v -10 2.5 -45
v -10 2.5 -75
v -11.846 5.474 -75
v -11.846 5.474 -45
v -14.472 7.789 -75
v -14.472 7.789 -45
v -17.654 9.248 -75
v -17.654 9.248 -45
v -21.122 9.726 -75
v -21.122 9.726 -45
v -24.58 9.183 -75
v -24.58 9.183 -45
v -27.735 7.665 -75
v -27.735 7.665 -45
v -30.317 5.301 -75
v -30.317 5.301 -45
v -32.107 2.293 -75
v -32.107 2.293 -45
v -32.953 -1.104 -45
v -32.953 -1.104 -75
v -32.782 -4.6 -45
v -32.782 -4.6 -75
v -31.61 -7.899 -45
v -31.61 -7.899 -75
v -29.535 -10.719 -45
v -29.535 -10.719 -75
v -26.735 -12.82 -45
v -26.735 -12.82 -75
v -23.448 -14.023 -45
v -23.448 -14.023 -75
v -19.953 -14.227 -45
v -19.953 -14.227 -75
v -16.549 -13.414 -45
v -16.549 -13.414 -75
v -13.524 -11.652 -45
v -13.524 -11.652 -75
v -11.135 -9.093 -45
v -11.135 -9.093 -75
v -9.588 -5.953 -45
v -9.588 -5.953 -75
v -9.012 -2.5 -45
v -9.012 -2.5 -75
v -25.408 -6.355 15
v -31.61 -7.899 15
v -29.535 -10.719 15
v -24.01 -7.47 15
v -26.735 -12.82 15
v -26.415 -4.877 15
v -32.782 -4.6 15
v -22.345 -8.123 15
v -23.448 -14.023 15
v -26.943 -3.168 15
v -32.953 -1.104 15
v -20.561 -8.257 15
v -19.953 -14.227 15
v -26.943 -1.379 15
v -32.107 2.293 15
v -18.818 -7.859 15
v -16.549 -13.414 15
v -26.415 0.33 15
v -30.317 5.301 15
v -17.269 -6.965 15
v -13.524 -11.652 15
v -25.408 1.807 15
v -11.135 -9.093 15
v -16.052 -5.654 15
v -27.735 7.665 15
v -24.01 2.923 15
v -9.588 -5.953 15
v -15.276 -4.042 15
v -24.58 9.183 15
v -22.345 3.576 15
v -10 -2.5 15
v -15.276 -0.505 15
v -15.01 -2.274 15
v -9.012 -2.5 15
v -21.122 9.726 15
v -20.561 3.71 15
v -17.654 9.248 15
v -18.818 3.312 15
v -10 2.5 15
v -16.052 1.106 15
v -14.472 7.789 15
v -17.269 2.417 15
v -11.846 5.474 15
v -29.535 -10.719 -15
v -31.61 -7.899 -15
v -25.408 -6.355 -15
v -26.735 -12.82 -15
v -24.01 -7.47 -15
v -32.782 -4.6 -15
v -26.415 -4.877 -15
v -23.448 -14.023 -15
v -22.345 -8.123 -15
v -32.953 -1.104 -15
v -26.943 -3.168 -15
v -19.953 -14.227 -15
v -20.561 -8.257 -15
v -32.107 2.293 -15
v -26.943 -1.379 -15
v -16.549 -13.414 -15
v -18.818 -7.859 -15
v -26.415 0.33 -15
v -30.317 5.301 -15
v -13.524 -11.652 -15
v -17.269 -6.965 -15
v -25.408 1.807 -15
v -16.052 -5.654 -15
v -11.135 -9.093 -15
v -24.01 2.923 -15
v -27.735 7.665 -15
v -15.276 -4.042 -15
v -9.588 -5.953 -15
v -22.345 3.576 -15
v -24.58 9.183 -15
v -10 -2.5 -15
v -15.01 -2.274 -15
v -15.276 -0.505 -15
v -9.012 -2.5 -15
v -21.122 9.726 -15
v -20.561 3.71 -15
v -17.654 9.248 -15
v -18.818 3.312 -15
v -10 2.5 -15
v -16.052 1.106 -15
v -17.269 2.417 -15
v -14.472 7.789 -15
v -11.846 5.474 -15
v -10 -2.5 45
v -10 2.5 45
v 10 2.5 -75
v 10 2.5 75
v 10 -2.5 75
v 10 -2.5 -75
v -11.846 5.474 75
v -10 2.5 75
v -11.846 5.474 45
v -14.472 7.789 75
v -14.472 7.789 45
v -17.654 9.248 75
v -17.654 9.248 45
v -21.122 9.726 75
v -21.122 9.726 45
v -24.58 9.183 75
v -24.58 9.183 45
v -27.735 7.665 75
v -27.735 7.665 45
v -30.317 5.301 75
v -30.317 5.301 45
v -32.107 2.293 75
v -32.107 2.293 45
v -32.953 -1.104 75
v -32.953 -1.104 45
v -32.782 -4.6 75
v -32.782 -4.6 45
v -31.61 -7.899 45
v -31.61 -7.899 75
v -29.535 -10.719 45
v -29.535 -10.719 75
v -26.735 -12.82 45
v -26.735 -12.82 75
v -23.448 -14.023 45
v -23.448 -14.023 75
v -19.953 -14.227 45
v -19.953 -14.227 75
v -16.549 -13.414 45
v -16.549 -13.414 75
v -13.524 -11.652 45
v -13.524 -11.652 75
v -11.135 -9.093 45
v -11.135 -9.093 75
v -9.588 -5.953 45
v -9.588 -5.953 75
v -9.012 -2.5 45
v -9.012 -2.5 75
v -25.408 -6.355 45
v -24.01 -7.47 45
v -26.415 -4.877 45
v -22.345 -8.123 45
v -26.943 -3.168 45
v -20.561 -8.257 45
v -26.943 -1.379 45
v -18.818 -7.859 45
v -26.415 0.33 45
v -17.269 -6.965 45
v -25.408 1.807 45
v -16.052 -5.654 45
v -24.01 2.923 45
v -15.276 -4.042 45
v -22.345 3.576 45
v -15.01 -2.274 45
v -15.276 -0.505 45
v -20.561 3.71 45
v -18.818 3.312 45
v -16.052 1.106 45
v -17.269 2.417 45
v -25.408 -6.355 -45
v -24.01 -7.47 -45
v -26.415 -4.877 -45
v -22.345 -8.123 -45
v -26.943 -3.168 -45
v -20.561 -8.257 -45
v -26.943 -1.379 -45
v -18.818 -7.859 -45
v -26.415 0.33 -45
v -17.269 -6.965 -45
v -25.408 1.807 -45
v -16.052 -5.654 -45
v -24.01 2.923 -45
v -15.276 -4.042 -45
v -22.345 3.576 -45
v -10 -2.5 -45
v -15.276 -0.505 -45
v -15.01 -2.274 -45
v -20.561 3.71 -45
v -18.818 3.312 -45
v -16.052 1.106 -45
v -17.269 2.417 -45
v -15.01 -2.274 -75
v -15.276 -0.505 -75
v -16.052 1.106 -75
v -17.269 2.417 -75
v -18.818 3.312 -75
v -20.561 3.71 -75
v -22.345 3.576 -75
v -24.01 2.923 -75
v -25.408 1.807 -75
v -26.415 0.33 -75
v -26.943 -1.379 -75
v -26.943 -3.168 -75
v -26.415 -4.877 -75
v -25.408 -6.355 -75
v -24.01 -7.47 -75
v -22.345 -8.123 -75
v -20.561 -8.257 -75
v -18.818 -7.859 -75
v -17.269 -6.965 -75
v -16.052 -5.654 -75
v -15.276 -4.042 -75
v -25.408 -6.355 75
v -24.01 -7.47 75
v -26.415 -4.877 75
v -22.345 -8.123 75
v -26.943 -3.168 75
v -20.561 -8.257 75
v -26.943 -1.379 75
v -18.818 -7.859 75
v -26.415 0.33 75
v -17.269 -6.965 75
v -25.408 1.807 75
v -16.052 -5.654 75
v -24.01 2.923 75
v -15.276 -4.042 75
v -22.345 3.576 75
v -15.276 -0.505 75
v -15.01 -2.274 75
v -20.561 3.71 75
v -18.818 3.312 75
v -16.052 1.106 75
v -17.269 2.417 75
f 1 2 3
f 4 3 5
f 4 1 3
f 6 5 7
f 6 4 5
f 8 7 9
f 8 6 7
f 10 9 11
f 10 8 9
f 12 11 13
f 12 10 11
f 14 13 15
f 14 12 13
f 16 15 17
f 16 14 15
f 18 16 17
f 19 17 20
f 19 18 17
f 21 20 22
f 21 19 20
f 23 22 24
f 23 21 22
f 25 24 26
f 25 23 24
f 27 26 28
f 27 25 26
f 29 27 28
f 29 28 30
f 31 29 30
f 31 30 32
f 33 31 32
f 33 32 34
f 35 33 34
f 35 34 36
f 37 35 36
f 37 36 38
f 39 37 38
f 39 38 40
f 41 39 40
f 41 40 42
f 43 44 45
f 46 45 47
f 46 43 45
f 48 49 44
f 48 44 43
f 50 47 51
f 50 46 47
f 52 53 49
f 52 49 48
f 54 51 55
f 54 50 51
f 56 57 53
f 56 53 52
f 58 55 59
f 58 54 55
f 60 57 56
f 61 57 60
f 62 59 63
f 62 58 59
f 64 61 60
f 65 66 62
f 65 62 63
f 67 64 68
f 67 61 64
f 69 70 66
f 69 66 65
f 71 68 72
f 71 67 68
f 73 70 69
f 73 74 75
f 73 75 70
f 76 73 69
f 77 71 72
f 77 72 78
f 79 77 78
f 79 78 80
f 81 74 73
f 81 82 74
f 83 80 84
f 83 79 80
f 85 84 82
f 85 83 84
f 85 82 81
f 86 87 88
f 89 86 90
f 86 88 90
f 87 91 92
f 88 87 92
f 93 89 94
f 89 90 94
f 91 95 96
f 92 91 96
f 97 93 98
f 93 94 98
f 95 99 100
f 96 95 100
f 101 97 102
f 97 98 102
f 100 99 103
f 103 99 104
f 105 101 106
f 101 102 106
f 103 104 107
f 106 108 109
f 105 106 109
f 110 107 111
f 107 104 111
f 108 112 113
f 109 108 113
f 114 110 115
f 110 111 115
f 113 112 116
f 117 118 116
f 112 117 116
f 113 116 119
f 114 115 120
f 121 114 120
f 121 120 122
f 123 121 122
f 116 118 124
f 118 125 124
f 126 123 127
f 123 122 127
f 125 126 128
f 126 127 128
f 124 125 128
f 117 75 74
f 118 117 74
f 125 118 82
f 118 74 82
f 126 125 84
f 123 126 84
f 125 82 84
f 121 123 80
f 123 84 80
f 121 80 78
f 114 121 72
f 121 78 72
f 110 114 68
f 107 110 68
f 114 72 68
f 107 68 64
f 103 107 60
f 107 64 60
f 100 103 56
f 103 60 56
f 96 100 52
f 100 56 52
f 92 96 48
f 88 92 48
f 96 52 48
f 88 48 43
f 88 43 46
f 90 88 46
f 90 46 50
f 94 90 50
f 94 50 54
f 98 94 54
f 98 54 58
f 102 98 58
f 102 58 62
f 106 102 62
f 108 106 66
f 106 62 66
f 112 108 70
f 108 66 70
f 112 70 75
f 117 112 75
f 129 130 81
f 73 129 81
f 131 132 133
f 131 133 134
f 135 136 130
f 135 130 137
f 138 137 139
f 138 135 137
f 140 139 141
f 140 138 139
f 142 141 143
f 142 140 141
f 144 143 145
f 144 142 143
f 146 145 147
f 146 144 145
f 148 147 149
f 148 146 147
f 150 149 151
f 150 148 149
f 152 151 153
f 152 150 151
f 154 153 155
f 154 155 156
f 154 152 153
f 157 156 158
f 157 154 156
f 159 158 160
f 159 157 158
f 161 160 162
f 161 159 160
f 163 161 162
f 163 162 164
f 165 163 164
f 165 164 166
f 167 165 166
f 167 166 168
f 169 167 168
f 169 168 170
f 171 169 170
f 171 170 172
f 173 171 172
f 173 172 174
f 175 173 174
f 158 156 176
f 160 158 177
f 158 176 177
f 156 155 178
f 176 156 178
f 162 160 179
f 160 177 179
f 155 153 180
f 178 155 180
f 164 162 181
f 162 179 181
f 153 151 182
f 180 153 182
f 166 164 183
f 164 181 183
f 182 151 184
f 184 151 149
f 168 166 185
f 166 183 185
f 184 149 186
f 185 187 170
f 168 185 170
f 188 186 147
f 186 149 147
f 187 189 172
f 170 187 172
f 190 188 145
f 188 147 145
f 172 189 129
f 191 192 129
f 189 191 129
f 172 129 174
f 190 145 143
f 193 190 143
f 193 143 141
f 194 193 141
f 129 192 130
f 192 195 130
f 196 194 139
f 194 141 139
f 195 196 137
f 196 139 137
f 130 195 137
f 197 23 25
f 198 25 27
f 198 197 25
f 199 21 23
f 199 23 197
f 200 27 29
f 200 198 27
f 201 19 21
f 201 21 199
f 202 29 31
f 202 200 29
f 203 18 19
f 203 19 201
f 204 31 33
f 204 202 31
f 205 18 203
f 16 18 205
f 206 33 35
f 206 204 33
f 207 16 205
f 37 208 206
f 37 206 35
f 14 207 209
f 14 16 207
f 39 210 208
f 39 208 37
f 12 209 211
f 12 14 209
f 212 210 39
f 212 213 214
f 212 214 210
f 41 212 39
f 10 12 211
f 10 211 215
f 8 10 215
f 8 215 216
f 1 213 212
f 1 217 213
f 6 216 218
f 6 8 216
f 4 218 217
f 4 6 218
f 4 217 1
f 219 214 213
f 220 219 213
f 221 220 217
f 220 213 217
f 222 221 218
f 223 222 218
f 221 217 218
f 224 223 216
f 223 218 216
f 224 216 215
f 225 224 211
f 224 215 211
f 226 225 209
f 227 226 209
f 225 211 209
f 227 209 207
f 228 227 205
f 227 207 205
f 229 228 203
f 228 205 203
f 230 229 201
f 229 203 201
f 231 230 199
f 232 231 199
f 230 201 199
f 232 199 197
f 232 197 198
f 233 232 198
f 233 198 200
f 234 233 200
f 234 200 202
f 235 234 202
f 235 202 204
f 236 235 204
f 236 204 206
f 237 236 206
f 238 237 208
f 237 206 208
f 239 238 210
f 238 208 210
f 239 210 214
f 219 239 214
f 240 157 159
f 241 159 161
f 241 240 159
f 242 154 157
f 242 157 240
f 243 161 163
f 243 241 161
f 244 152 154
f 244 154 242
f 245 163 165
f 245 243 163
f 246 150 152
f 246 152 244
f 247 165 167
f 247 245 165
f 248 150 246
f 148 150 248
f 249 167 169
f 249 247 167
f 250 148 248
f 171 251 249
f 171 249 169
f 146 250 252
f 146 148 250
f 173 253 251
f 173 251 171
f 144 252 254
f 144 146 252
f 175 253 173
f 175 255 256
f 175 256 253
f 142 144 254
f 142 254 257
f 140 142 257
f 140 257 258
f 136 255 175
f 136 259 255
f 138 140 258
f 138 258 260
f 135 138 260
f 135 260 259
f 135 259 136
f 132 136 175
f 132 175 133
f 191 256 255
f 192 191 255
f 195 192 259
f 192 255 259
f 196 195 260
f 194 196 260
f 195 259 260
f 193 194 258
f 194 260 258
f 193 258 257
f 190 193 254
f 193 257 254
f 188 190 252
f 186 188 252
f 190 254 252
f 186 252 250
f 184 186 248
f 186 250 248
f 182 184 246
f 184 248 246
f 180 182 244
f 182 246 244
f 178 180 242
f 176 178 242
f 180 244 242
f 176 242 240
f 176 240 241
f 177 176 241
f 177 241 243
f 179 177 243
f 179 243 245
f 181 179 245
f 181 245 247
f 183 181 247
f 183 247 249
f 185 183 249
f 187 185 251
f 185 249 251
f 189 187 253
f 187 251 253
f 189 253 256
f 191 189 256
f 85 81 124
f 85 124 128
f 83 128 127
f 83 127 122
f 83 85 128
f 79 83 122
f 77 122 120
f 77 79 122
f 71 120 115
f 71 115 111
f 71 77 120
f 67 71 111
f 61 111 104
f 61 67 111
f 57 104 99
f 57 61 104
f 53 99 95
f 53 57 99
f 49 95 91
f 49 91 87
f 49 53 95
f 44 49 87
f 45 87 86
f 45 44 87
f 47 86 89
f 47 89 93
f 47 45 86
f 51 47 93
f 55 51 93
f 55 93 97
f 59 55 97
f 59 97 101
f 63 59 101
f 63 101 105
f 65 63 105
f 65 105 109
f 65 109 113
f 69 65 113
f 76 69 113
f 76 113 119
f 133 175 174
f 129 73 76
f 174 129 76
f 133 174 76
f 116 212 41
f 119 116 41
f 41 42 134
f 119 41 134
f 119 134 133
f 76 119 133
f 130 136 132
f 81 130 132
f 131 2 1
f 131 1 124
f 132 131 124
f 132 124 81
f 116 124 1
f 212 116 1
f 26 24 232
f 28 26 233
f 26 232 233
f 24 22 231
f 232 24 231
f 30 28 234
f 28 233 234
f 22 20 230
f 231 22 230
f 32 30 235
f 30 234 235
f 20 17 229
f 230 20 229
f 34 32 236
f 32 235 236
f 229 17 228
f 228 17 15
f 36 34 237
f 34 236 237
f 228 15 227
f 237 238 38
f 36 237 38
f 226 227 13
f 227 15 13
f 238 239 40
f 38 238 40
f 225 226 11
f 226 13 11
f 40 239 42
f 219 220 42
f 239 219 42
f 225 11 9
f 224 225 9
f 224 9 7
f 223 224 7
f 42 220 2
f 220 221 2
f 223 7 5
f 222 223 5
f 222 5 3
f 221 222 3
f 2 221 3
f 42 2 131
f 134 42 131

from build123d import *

# Parameters (mm, degrees)
SKETCH1_W           = 20
SKETCH1_H           = 150
BOSS_EXTRUDE1_DEPTH = 2.5
SKETCH5_R           = 12
SKETCH5_R_2         = 6
BOSS_EXTRUDE2_DEPTH = 30
LPATTERN1_COUNT     = 3
LPATTERN1_PITCH     = 60


with BuildPart() as part:
    # Sketch1 → Boss-Extrude1 (new body, symmetric)
    with BuildSketch(Plane(origin=(0, 0, 0), x_dir=(1, 0, 0), z_dir=(0, 1, 0))):
        Rectangle(SKETCH1_W, SKETCH1_H)
    extrude(amount=BOSS_EXTRUDE1_DEPTH, both=True)

    # Sketch5 → Boss-Extrude2 (add)
    with BuildSketch(Plane.XY.offset(75)):
        with Locations((-21.009649651, -2.273637457)):
            Circle(SKETCH5_R)
        with Locations((-21.009649651, -2.273637457)):
            Circle(SKETCH5_R_2, mode=Mode.SUBTRACT)
    boss_extrude2 = extrude(amount=-BOSS_EXTRUDE2_DEPTH)

    # LPattern1: Boss-Extrude2 ×3
    with Locations(*[(0, 0, -i * LPATTERN1_PITCH) for i in range(1, LPATTERN1_COUNT)]):
        add(boss_extrude2)


solid = part.part
